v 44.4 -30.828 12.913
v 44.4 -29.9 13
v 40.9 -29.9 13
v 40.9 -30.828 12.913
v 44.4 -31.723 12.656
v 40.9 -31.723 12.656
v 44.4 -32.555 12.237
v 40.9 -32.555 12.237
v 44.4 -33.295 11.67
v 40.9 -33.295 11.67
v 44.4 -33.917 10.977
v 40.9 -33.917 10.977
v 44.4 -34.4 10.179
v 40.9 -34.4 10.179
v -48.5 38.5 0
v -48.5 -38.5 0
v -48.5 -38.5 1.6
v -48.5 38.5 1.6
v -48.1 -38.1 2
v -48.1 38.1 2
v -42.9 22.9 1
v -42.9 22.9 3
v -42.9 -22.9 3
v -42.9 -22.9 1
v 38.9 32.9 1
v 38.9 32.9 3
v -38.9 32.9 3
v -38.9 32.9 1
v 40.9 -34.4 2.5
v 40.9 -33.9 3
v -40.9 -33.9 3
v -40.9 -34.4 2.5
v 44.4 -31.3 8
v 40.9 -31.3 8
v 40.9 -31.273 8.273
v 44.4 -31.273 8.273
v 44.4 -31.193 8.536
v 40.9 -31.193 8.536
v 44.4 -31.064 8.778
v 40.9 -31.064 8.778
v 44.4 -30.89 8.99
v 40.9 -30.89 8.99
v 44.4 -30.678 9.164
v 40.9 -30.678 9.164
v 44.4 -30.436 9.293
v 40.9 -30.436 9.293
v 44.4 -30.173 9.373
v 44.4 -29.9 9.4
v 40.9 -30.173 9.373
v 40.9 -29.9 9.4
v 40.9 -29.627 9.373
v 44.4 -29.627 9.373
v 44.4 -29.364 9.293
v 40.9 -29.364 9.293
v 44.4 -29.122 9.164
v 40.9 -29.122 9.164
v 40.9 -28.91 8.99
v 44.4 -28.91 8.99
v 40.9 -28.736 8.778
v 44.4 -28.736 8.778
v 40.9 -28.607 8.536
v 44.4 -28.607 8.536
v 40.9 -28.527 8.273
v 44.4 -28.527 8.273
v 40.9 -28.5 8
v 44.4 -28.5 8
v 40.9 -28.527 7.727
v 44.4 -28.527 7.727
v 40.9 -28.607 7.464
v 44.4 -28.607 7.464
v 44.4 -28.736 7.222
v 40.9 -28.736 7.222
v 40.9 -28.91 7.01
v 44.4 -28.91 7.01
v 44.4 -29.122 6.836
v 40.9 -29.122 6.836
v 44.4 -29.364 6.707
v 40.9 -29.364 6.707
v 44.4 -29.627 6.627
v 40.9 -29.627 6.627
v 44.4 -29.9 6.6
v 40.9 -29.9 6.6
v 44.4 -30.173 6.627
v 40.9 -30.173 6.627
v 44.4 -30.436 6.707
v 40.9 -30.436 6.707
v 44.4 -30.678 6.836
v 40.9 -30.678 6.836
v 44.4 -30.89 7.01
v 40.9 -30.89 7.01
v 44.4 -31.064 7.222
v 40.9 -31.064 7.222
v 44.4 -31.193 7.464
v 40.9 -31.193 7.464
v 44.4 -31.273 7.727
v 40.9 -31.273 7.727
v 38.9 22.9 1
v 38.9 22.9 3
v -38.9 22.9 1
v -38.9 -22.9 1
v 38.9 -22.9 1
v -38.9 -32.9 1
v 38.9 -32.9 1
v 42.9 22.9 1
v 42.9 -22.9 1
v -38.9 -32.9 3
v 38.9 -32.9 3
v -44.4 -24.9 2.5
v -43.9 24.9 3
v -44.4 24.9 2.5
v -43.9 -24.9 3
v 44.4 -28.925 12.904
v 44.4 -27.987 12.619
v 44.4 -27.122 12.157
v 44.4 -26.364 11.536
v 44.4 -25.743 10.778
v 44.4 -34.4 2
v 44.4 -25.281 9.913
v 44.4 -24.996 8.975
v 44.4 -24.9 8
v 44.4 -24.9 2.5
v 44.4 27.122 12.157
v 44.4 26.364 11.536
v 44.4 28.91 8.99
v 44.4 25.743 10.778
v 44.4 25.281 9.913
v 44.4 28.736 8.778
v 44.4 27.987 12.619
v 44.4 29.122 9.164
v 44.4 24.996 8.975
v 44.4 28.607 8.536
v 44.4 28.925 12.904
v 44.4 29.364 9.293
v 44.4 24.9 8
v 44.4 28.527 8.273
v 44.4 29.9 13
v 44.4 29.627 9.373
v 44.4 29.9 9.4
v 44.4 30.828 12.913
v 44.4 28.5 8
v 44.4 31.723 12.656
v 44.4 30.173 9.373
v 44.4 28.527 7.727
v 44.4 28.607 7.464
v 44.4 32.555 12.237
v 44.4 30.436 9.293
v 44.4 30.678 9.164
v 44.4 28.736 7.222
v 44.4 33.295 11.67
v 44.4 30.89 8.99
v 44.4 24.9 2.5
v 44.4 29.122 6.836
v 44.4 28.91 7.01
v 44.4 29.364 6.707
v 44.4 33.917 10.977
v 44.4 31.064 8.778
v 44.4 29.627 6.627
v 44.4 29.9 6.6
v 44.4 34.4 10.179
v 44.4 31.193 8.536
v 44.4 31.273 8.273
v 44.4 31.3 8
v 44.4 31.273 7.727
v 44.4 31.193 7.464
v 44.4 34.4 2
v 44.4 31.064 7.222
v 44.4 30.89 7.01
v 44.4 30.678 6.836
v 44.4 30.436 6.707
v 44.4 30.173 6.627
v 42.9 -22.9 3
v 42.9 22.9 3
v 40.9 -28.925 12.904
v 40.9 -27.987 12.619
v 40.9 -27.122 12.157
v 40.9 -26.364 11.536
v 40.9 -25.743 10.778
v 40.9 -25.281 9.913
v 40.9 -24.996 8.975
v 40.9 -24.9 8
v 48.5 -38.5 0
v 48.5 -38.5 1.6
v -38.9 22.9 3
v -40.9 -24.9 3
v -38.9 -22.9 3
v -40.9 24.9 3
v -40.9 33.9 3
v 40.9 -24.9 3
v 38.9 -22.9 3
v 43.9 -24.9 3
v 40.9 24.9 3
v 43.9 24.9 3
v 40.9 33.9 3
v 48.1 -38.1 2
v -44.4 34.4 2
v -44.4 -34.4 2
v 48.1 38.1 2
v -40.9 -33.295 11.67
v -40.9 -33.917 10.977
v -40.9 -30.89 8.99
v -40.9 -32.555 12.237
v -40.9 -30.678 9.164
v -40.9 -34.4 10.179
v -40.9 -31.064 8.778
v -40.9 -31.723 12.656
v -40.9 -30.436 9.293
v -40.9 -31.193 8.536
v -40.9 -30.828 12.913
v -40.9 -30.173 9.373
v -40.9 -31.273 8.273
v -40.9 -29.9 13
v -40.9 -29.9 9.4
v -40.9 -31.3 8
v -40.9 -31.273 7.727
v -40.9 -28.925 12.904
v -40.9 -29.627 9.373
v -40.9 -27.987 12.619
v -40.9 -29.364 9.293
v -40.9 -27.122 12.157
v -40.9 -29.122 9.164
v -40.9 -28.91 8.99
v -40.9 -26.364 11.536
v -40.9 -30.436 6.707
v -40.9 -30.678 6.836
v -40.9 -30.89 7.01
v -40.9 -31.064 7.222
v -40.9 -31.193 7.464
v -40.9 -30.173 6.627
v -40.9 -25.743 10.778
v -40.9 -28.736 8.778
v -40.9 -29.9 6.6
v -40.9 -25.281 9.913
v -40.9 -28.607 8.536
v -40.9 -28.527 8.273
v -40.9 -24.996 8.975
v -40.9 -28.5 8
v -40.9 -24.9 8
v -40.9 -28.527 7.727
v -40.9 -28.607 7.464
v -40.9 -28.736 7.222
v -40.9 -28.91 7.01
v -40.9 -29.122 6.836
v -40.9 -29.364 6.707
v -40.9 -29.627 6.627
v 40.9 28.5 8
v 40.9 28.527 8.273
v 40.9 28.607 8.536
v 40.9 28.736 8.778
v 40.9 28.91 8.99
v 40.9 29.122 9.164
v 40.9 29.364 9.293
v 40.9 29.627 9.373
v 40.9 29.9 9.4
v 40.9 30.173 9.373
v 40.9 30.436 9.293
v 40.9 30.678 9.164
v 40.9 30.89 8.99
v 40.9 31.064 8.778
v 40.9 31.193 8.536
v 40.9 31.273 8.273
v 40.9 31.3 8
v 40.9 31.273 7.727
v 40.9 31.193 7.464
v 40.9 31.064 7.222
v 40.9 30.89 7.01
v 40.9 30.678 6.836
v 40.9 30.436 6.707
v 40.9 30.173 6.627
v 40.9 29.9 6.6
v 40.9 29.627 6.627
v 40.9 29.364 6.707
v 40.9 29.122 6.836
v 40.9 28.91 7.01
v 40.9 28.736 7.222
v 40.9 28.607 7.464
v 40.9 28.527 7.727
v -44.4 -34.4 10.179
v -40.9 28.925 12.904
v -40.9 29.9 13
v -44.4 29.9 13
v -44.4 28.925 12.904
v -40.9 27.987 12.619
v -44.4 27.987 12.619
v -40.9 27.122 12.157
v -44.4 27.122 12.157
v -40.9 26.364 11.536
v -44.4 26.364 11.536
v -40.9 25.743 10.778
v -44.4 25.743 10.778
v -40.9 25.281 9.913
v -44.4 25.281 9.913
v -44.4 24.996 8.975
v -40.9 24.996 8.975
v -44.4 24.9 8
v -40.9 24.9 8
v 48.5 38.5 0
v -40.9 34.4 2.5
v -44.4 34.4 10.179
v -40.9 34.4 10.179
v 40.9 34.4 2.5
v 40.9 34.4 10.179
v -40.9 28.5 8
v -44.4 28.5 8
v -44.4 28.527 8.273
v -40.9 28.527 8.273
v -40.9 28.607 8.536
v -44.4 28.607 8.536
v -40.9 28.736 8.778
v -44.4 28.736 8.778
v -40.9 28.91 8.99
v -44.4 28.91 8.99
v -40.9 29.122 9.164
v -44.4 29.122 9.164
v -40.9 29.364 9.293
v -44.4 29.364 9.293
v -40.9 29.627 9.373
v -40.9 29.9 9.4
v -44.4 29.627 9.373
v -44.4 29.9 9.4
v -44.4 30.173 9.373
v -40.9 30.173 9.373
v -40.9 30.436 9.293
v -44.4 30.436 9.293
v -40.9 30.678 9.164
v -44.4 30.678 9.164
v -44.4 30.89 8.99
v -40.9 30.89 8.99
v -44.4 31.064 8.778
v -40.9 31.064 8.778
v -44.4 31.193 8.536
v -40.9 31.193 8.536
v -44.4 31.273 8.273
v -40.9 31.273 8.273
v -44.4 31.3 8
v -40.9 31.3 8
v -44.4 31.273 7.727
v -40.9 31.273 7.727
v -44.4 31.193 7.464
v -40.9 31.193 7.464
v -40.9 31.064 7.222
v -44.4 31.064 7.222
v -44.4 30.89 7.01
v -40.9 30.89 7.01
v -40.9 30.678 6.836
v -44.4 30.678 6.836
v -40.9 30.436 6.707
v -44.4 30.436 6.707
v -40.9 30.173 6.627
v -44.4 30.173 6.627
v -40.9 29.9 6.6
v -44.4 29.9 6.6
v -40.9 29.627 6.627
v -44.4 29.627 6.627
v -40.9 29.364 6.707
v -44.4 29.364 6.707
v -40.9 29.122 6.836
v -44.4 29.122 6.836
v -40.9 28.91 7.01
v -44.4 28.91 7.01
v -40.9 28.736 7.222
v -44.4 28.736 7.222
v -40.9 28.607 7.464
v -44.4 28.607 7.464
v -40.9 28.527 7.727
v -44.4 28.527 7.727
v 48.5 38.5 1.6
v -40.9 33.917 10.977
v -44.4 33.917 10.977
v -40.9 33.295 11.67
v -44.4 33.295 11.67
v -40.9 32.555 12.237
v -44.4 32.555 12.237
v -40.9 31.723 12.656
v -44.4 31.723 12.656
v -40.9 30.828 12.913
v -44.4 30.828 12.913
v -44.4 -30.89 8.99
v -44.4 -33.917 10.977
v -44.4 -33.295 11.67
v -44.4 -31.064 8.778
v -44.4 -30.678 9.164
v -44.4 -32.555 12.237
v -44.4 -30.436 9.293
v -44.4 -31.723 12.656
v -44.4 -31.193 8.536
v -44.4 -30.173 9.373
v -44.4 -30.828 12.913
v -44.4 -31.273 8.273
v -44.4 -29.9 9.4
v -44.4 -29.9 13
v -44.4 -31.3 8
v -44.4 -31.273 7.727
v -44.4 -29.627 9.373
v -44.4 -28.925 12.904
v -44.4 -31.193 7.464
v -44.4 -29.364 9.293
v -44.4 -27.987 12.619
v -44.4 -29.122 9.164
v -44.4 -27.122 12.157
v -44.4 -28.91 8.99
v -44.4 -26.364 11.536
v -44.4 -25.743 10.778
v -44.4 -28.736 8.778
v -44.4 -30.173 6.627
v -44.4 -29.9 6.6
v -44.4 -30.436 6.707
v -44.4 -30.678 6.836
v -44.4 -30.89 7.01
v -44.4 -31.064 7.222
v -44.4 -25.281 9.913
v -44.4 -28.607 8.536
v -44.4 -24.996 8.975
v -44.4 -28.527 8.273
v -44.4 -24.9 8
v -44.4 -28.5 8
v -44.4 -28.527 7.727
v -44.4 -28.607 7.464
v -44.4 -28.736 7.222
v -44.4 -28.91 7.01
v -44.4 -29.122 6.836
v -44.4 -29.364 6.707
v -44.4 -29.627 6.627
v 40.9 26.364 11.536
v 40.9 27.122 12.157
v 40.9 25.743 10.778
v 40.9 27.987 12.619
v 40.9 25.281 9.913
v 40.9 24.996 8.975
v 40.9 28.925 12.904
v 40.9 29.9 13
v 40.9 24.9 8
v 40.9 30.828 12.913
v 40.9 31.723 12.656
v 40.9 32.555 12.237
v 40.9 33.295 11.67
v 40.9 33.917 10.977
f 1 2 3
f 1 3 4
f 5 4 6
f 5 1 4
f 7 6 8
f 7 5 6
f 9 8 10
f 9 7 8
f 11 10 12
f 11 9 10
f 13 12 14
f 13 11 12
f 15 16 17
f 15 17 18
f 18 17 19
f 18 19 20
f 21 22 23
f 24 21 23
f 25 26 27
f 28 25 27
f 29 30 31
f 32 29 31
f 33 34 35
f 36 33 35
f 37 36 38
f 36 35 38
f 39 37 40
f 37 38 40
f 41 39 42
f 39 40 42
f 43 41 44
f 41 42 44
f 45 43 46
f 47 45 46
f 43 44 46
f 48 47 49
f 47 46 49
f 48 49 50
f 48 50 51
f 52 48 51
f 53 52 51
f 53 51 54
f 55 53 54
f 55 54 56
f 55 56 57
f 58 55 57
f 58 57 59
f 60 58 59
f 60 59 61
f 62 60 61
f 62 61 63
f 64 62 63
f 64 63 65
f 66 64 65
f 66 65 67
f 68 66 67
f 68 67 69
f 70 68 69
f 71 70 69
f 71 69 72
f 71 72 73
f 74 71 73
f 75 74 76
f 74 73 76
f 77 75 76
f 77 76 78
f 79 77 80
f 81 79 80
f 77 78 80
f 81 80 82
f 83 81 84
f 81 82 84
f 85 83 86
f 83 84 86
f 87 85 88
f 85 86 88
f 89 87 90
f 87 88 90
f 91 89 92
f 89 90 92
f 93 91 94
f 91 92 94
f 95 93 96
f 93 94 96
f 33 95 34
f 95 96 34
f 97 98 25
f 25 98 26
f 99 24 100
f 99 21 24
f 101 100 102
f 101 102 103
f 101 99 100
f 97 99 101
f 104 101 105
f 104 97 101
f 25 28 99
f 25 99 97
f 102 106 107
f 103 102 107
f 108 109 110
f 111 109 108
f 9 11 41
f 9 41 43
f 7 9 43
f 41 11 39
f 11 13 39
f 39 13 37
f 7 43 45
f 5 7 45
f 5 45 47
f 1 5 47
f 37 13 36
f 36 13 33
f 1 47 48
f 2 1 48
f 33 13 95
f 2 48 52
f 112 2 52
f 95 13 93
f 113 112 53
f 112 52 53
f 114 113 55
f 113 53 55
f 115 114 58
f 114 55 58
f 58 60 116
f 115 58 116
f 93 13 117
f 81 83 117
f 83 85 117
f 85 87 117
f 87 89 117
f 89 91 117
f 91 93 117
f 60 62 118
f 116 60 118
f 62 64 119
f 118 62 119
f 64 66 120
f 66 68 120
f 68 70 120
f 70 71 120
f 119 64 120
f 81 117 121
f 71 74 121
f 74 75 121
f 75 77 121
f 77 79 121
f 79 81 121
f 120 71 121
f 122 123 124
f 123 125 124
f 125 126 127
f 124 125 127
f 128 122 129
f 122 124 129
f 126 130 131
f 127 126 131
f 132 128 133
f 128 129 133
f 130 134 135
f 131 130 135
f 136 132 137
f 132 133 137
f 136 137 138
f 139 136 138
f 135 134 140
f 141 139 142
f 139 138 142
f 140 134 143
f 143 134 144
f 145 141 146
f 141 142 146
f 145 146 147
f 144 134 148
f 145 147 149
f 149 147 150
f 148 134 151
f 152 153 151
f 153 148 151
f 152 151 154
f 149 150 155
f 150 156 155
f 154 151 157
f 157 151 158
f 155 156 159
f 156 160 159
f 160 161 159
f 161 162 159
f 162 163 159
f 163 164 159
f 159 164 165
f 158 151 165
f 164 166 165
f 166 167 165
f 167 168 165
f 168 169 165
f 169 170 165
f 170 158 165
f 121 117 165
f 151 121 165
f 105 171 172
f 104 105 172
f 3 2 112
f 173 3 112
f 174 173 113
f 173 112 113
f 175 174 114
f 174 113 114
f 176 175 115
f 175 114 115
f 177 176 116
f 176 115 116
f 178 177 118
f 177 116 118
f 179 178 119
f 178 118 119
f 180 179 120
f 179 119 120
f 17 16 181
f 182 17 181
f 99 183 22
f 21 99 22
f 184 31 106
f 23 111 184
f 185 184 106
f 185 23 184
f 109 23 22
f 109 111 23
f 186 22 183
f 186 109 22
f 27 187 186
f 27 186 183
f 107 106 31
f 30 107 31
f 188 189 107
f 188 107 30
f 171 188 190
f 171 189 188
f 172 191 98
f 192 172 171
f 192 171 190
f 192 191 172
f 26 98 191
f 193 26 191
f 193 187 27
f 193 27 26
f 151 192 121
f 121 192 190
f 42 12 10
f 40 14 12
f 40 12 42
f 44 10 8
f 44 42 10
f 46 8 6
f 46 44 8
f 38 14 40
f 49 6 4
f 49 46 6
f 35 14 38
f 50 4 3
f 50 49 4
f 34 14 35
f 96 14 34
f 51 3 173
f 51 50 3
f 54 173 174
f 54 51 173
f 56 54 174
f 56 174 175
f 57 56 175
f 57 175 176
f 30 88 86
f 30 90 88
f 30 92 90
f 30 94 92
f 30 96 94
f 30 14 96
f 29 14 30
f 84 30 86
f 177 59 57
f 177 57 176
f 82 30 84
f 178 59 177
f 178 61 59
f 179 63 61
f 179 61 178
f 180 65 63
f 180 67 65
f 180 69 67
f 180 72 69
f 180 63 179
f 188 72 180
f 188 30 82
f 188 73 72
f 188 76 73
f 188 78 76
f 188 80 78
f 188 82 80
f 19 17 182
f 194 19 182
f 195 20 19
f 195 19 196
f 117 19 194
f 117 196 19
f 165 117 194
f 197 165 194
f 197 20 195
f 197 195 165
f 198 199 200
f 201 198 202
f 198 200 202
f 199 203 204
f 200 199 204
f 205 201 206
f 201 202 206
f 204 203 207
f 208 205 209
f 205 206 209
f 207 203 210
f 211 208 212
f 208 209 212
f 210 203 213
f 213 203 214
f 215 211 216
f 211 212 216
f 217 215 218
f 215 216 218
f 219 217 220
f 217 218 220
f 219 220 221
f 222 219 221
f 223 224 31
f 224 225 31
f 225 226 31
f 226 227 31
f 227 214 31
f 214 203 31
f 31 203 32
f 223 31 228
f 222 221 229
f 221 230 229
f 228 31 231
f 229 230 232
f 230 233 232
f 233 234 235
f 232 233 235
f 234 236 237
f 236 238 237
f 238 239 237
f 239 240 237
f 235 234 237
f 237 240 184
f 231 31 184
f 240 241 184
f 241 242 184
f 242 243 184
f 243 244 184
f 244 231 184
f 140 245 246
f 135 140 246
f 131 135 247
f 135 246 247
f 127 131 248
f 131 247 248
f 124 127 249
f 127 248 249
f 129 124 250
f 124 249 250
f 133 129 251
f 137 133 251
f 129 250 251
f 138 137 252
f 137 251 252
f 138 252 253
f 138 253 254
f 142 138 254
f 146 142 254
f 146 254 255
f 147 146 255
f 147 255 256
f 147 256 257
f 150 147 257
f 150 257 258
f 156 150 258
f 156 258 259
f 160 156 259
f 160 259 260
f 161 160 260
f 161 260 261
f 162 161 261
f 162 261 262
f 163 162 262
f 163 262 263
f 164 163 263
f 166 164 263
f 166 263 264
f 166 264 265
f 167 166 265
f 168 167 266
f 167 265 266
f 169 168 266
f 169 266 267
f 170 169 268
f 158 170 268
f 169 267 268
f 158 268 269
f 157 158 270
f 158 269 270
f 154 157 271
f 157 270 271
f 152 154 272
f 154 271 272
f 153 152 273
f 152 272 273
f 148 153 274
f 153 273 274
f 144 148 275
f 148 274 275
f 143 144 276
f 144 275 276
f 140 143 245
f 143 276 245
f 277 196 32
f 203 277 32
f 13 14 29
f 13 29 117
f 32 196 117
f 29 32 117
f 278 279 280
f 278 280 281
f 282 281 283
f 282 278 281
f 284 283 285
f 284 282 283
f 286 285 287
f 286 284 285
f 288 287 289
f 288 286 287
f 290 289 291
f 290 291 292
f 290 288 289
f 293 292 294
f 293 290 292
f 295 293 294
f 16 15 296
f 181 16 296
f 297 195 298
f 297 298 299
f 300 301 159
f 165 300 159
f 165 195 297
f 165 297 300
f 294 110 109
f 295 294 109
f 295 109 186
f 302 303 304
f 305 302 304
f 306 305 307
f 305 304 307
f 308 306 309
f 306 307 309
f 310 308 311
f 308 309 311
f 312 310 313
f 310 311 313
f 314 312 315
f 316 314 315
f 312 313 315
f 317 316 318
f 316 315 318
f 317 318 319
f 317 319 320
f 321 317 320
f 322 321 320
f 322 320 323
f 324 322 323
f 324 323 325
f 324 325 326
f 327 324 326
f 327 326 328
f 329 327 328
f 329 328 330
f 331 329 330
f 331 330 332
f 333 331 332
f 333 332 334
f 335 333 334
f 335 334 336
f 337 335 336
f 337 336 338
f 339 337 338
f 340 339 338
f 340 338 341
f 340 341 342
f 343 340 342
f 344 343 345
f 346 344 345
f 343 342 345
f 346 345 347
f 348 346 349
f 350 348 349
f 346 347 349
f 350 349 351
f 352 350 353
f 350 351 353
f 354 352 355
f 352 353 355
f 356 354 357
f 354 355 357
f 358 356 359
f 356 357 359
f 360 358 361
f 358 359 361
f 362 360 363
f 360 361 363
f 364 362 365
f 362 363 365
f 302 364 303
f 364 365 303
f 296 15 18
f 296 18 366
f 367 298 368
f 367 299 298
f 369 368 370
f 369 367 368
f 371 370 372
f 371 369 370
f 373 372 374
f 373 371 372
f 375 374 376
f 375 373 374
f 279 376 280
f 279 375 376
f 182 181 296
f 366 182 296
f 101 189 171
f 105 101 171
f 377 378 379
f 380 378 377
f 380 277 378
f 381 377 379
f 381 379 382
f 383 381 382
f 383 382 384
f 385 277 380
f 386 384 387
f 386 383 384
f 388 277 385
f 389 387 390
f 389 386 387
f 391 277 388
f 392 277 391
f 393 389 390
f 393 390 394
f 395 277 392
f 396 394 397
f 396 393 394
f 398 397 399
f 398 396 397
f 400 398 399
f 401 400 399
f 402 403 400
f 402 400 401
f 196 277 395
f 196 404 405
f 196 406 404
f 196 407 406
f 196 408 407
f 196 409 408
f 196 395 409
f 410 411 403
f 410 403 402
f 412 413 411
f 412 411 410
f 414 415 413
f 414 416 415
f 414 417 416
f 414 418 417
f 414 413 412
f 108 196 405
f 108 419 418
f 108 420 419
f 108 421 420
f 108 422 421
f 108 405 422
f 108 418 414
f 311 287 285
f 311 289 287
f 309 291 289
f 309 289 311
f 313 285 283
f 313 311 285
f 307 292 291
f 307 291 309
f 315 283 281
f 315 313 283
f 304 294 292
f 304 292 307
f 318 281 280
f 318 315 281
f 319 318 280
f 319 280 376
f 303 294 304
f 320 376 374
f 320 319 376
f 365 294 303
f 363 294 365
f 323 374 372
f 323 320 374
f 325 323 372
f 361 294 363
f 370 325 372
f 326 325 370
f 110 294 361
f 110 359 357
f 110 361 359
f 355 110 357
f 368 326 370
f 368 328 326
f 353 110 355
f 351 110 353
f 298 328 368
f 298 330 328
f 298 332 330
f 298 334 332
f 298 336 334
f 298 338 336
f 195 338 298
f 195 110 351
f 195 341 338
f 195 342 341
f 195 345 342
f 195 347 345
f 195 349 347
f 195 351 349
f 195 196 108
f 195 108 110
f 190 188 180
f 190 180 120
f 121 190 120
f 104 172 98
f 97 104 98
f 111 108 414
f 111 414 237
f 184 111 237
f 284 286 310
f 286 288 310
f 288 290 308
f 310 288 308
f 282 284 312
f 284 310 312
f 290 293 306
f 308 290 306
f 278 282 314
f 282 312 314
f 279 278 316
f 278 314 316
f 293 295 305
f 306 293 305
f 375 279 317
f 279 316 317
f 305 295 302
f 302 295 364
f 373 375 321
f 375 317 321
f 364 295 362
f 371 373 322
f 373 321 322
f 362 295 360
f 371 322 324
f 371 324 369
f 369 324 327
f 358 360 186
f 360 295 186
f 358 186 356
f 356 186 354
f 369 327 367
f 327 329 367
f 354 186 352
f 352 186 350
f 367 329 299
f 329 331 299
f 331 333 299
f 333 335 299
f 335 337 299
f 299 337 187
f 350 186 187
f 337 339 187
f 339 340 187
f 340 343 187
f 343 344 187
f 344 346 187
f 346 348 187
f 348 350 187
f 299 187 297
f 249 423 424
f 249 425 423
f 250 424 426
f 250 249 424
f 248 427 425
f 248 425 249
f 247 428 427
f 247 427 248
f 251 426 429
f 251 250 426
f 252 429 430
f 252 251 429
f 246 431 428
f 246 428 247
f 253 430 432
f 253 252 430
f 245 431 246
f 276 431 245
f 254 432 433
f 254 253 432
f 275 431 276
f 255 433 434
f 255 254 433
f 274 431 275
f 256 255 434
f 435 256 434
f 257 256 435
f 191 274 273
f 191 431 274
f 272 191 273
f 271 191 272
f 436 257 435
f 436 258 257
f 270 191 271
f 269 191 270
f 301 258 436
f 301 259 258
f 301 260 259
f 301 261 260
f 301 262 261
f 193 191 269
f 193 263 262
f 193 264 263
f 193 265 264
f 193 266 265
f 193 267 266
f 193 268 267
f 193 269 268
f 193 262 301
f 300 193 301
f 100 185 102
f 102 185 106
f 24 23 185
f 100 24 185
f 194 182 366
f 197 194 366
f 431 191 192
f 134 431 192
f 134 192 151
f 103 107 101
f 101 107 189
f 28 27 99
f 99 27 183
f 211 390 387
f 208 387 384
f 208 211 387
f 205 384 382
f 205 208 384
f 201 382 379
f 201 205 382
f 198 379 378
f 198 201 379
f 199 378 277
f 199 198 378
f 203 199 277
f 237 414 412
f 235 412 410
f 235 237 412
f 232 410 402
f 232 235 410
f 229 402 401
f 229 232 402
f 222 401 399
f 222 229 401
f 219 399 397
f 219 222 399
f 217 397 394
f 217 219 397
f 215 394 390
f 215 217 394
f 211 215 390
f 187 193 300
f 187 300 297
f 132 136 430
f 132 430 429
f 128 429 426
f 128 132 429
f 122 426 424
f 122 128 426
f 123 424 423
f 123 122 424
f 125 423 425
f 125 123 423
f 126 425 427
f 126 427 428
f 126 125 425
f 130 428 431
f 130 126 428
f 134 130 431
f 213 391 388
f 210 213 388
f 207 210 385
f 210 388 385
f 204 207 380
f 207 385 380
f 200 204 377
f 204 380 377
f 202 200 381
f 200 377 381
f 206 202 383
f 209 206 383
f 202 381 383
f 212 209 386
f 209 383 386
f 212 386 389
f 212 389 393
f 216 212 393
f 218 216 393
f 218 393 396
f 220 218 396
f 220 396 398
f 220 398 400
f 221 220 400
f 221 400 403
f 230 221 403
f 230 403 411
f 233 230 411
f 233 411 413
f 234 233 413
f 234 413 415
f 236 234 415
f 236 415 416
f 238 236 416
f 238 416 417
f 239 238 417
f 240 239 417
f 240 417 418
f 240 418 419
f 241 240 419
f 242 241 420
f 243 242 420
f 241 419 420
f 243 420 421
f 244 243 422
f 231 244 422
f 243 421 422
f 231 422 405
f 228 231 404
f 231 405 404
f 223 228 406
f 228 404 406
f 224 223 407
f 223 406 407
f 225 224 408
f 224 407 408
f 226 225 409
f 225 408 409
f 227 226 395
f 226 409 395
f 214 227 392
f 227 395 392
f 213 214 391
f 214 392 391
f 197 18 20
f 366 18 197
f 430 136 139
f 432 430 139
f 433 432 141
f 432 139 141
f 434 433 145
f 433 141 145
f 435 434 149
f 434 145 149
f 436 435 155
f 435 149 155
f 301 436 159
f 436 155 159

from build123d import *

# Parameters (mm, degrees)
F0_W      = 97
F0_H      = 77
F1_DEPTH  = 2
F2_W      = 89.8
F2_H      = 69.8
F3_DEPTH  = 1
F4_W      = 4
F4_H      = 10
F5_DEPTH  = 10
F6_R      = 4.99999
F7_R      = 1.4
F8_DEPTH  = 93.401
F10_DEPTH = 2
F11_W     = 97
F11_H     = 77
F11_W_2   = 88.8
F11_H_2   = 68.8
F12_DEPTH = 11.001
F13_SIZE  = 0.5
F14_SIZE  = 0.4


# Not quite as in the source:
# - a fillet or chamfer is up to 0.001 mm smaller than in the source, because OpenCascade refuses the exact size


with BuildPart() as f1:
    # F0 (on Top) → F1 (new body)
    with BuildSketch(Plane.XY):
        Rectangle(F0_W, F0_H)
    extrude(amount=F1_DEPTH)

    # F2 (on face) → F3 (join)
    with BuildSketch(Plane.XY.offset(2)):
        Rectangle(F2_W, F2_H)
    extrude(amount=F3_DEPTH)

    # F4 (on face) → F5 (join)
    with BuildSketch(Plane.XY.offset(3)):
        with Locations((-42.9, 29.9)):
            Rectangle(F4_W, F4_H)
        with Locations((42.9, 29.9)):
            Rectangle(F4_W, F4_H)
        with Locations((-42.9, -29.9)):
            Rectangle(F4_W, F4_H)
        with Locations((42.9, -29.9)):
            Rectangle(F4_W, F4_H)
    extrude(amount=F5_DEPTH)

    # F6 (radius 5 in the source; OpenCascade refuses exactly that, so slightly less here)
    f6_edges = [f1.edges().sort_by_distance(p)[0] for p in [
        (42.9, 34.9, 13),
        (42.9, 24.9, 13),
        (42.9, -24.9, 13),
        (42.9, -34.9, 13),
        (-42.9, -24.9, 13),
        (-42.9, -34.9, 13),
        (-42.9, 34.9, 13),
        (-42.9, 24.9, 13),
    ]]
    fillet(f6_edges, radius=F6_R)

    # F7 (on face) → F8 (cut, through all)
    with BuildSketch(Plane(origin=(-44.9, 0, 0), x_dir=(0, -1, 0), z_dir=(-1, 0, 0))):
        with Locations((-29.9, 8)):
            Circle(F7_R)
        with Locations((29.9, 8)):
            Circle(F7_R)
    extrude(amount=-F8_DEPTH, mode=Mode.SUBTRACT)

    # F9 (on face) → F10 (cut)
    with BuildSketch(Plane.XY.offset(3)):
        Polygon((-42.9, -22.9), (-38.9, -22.9), (-38.9, -32.9), (38.9, -32.9), (38.9, -22.9), (42.9, -22.9), (42.9, 22.9), (38.9, 22.9), (38.9, 32.9), (-38.9, 32.9), (-38.9, 22.9), (-42.9, 22.9), align=None)
    extrude(amount=-F10_DEPTH, mode=Mode.SUBTRACT)

    # F11 (on face) → F12 (cut, through all)
    with BuildSketch(Plane.XY.offset(2)):
        Rectangle(F11_W, F11_H)
        Rectangle(F11_W_2, F11_H_2, mode=Mode.SUBTRACT)
    extrude(amount=F12_DEPTH, mode=Mode.SUBTRACT)

    # F13
    f13_edges = [f1.edges().sort_by_distance(p)[0] for p in [
        (44.4, 0, 3),
        (0, -34.4, 3),
        (-44.4, 0, 3),
        (0, 34.4, 3),
    ]]
    chamfer(f13_edges, length=F13_SIZE)

    # F14
    f14_edges = [f1.edges().sort_by_distance(p)[0] for p in [
        (-48.5, 0, 2),
        (0, 38.5, 2),
        (48.5, 0, 2),
        (0, -38.5, 2),
    ]]
    chamfer(f14_edges, length=F14_SIZE)


solid = f1.part
